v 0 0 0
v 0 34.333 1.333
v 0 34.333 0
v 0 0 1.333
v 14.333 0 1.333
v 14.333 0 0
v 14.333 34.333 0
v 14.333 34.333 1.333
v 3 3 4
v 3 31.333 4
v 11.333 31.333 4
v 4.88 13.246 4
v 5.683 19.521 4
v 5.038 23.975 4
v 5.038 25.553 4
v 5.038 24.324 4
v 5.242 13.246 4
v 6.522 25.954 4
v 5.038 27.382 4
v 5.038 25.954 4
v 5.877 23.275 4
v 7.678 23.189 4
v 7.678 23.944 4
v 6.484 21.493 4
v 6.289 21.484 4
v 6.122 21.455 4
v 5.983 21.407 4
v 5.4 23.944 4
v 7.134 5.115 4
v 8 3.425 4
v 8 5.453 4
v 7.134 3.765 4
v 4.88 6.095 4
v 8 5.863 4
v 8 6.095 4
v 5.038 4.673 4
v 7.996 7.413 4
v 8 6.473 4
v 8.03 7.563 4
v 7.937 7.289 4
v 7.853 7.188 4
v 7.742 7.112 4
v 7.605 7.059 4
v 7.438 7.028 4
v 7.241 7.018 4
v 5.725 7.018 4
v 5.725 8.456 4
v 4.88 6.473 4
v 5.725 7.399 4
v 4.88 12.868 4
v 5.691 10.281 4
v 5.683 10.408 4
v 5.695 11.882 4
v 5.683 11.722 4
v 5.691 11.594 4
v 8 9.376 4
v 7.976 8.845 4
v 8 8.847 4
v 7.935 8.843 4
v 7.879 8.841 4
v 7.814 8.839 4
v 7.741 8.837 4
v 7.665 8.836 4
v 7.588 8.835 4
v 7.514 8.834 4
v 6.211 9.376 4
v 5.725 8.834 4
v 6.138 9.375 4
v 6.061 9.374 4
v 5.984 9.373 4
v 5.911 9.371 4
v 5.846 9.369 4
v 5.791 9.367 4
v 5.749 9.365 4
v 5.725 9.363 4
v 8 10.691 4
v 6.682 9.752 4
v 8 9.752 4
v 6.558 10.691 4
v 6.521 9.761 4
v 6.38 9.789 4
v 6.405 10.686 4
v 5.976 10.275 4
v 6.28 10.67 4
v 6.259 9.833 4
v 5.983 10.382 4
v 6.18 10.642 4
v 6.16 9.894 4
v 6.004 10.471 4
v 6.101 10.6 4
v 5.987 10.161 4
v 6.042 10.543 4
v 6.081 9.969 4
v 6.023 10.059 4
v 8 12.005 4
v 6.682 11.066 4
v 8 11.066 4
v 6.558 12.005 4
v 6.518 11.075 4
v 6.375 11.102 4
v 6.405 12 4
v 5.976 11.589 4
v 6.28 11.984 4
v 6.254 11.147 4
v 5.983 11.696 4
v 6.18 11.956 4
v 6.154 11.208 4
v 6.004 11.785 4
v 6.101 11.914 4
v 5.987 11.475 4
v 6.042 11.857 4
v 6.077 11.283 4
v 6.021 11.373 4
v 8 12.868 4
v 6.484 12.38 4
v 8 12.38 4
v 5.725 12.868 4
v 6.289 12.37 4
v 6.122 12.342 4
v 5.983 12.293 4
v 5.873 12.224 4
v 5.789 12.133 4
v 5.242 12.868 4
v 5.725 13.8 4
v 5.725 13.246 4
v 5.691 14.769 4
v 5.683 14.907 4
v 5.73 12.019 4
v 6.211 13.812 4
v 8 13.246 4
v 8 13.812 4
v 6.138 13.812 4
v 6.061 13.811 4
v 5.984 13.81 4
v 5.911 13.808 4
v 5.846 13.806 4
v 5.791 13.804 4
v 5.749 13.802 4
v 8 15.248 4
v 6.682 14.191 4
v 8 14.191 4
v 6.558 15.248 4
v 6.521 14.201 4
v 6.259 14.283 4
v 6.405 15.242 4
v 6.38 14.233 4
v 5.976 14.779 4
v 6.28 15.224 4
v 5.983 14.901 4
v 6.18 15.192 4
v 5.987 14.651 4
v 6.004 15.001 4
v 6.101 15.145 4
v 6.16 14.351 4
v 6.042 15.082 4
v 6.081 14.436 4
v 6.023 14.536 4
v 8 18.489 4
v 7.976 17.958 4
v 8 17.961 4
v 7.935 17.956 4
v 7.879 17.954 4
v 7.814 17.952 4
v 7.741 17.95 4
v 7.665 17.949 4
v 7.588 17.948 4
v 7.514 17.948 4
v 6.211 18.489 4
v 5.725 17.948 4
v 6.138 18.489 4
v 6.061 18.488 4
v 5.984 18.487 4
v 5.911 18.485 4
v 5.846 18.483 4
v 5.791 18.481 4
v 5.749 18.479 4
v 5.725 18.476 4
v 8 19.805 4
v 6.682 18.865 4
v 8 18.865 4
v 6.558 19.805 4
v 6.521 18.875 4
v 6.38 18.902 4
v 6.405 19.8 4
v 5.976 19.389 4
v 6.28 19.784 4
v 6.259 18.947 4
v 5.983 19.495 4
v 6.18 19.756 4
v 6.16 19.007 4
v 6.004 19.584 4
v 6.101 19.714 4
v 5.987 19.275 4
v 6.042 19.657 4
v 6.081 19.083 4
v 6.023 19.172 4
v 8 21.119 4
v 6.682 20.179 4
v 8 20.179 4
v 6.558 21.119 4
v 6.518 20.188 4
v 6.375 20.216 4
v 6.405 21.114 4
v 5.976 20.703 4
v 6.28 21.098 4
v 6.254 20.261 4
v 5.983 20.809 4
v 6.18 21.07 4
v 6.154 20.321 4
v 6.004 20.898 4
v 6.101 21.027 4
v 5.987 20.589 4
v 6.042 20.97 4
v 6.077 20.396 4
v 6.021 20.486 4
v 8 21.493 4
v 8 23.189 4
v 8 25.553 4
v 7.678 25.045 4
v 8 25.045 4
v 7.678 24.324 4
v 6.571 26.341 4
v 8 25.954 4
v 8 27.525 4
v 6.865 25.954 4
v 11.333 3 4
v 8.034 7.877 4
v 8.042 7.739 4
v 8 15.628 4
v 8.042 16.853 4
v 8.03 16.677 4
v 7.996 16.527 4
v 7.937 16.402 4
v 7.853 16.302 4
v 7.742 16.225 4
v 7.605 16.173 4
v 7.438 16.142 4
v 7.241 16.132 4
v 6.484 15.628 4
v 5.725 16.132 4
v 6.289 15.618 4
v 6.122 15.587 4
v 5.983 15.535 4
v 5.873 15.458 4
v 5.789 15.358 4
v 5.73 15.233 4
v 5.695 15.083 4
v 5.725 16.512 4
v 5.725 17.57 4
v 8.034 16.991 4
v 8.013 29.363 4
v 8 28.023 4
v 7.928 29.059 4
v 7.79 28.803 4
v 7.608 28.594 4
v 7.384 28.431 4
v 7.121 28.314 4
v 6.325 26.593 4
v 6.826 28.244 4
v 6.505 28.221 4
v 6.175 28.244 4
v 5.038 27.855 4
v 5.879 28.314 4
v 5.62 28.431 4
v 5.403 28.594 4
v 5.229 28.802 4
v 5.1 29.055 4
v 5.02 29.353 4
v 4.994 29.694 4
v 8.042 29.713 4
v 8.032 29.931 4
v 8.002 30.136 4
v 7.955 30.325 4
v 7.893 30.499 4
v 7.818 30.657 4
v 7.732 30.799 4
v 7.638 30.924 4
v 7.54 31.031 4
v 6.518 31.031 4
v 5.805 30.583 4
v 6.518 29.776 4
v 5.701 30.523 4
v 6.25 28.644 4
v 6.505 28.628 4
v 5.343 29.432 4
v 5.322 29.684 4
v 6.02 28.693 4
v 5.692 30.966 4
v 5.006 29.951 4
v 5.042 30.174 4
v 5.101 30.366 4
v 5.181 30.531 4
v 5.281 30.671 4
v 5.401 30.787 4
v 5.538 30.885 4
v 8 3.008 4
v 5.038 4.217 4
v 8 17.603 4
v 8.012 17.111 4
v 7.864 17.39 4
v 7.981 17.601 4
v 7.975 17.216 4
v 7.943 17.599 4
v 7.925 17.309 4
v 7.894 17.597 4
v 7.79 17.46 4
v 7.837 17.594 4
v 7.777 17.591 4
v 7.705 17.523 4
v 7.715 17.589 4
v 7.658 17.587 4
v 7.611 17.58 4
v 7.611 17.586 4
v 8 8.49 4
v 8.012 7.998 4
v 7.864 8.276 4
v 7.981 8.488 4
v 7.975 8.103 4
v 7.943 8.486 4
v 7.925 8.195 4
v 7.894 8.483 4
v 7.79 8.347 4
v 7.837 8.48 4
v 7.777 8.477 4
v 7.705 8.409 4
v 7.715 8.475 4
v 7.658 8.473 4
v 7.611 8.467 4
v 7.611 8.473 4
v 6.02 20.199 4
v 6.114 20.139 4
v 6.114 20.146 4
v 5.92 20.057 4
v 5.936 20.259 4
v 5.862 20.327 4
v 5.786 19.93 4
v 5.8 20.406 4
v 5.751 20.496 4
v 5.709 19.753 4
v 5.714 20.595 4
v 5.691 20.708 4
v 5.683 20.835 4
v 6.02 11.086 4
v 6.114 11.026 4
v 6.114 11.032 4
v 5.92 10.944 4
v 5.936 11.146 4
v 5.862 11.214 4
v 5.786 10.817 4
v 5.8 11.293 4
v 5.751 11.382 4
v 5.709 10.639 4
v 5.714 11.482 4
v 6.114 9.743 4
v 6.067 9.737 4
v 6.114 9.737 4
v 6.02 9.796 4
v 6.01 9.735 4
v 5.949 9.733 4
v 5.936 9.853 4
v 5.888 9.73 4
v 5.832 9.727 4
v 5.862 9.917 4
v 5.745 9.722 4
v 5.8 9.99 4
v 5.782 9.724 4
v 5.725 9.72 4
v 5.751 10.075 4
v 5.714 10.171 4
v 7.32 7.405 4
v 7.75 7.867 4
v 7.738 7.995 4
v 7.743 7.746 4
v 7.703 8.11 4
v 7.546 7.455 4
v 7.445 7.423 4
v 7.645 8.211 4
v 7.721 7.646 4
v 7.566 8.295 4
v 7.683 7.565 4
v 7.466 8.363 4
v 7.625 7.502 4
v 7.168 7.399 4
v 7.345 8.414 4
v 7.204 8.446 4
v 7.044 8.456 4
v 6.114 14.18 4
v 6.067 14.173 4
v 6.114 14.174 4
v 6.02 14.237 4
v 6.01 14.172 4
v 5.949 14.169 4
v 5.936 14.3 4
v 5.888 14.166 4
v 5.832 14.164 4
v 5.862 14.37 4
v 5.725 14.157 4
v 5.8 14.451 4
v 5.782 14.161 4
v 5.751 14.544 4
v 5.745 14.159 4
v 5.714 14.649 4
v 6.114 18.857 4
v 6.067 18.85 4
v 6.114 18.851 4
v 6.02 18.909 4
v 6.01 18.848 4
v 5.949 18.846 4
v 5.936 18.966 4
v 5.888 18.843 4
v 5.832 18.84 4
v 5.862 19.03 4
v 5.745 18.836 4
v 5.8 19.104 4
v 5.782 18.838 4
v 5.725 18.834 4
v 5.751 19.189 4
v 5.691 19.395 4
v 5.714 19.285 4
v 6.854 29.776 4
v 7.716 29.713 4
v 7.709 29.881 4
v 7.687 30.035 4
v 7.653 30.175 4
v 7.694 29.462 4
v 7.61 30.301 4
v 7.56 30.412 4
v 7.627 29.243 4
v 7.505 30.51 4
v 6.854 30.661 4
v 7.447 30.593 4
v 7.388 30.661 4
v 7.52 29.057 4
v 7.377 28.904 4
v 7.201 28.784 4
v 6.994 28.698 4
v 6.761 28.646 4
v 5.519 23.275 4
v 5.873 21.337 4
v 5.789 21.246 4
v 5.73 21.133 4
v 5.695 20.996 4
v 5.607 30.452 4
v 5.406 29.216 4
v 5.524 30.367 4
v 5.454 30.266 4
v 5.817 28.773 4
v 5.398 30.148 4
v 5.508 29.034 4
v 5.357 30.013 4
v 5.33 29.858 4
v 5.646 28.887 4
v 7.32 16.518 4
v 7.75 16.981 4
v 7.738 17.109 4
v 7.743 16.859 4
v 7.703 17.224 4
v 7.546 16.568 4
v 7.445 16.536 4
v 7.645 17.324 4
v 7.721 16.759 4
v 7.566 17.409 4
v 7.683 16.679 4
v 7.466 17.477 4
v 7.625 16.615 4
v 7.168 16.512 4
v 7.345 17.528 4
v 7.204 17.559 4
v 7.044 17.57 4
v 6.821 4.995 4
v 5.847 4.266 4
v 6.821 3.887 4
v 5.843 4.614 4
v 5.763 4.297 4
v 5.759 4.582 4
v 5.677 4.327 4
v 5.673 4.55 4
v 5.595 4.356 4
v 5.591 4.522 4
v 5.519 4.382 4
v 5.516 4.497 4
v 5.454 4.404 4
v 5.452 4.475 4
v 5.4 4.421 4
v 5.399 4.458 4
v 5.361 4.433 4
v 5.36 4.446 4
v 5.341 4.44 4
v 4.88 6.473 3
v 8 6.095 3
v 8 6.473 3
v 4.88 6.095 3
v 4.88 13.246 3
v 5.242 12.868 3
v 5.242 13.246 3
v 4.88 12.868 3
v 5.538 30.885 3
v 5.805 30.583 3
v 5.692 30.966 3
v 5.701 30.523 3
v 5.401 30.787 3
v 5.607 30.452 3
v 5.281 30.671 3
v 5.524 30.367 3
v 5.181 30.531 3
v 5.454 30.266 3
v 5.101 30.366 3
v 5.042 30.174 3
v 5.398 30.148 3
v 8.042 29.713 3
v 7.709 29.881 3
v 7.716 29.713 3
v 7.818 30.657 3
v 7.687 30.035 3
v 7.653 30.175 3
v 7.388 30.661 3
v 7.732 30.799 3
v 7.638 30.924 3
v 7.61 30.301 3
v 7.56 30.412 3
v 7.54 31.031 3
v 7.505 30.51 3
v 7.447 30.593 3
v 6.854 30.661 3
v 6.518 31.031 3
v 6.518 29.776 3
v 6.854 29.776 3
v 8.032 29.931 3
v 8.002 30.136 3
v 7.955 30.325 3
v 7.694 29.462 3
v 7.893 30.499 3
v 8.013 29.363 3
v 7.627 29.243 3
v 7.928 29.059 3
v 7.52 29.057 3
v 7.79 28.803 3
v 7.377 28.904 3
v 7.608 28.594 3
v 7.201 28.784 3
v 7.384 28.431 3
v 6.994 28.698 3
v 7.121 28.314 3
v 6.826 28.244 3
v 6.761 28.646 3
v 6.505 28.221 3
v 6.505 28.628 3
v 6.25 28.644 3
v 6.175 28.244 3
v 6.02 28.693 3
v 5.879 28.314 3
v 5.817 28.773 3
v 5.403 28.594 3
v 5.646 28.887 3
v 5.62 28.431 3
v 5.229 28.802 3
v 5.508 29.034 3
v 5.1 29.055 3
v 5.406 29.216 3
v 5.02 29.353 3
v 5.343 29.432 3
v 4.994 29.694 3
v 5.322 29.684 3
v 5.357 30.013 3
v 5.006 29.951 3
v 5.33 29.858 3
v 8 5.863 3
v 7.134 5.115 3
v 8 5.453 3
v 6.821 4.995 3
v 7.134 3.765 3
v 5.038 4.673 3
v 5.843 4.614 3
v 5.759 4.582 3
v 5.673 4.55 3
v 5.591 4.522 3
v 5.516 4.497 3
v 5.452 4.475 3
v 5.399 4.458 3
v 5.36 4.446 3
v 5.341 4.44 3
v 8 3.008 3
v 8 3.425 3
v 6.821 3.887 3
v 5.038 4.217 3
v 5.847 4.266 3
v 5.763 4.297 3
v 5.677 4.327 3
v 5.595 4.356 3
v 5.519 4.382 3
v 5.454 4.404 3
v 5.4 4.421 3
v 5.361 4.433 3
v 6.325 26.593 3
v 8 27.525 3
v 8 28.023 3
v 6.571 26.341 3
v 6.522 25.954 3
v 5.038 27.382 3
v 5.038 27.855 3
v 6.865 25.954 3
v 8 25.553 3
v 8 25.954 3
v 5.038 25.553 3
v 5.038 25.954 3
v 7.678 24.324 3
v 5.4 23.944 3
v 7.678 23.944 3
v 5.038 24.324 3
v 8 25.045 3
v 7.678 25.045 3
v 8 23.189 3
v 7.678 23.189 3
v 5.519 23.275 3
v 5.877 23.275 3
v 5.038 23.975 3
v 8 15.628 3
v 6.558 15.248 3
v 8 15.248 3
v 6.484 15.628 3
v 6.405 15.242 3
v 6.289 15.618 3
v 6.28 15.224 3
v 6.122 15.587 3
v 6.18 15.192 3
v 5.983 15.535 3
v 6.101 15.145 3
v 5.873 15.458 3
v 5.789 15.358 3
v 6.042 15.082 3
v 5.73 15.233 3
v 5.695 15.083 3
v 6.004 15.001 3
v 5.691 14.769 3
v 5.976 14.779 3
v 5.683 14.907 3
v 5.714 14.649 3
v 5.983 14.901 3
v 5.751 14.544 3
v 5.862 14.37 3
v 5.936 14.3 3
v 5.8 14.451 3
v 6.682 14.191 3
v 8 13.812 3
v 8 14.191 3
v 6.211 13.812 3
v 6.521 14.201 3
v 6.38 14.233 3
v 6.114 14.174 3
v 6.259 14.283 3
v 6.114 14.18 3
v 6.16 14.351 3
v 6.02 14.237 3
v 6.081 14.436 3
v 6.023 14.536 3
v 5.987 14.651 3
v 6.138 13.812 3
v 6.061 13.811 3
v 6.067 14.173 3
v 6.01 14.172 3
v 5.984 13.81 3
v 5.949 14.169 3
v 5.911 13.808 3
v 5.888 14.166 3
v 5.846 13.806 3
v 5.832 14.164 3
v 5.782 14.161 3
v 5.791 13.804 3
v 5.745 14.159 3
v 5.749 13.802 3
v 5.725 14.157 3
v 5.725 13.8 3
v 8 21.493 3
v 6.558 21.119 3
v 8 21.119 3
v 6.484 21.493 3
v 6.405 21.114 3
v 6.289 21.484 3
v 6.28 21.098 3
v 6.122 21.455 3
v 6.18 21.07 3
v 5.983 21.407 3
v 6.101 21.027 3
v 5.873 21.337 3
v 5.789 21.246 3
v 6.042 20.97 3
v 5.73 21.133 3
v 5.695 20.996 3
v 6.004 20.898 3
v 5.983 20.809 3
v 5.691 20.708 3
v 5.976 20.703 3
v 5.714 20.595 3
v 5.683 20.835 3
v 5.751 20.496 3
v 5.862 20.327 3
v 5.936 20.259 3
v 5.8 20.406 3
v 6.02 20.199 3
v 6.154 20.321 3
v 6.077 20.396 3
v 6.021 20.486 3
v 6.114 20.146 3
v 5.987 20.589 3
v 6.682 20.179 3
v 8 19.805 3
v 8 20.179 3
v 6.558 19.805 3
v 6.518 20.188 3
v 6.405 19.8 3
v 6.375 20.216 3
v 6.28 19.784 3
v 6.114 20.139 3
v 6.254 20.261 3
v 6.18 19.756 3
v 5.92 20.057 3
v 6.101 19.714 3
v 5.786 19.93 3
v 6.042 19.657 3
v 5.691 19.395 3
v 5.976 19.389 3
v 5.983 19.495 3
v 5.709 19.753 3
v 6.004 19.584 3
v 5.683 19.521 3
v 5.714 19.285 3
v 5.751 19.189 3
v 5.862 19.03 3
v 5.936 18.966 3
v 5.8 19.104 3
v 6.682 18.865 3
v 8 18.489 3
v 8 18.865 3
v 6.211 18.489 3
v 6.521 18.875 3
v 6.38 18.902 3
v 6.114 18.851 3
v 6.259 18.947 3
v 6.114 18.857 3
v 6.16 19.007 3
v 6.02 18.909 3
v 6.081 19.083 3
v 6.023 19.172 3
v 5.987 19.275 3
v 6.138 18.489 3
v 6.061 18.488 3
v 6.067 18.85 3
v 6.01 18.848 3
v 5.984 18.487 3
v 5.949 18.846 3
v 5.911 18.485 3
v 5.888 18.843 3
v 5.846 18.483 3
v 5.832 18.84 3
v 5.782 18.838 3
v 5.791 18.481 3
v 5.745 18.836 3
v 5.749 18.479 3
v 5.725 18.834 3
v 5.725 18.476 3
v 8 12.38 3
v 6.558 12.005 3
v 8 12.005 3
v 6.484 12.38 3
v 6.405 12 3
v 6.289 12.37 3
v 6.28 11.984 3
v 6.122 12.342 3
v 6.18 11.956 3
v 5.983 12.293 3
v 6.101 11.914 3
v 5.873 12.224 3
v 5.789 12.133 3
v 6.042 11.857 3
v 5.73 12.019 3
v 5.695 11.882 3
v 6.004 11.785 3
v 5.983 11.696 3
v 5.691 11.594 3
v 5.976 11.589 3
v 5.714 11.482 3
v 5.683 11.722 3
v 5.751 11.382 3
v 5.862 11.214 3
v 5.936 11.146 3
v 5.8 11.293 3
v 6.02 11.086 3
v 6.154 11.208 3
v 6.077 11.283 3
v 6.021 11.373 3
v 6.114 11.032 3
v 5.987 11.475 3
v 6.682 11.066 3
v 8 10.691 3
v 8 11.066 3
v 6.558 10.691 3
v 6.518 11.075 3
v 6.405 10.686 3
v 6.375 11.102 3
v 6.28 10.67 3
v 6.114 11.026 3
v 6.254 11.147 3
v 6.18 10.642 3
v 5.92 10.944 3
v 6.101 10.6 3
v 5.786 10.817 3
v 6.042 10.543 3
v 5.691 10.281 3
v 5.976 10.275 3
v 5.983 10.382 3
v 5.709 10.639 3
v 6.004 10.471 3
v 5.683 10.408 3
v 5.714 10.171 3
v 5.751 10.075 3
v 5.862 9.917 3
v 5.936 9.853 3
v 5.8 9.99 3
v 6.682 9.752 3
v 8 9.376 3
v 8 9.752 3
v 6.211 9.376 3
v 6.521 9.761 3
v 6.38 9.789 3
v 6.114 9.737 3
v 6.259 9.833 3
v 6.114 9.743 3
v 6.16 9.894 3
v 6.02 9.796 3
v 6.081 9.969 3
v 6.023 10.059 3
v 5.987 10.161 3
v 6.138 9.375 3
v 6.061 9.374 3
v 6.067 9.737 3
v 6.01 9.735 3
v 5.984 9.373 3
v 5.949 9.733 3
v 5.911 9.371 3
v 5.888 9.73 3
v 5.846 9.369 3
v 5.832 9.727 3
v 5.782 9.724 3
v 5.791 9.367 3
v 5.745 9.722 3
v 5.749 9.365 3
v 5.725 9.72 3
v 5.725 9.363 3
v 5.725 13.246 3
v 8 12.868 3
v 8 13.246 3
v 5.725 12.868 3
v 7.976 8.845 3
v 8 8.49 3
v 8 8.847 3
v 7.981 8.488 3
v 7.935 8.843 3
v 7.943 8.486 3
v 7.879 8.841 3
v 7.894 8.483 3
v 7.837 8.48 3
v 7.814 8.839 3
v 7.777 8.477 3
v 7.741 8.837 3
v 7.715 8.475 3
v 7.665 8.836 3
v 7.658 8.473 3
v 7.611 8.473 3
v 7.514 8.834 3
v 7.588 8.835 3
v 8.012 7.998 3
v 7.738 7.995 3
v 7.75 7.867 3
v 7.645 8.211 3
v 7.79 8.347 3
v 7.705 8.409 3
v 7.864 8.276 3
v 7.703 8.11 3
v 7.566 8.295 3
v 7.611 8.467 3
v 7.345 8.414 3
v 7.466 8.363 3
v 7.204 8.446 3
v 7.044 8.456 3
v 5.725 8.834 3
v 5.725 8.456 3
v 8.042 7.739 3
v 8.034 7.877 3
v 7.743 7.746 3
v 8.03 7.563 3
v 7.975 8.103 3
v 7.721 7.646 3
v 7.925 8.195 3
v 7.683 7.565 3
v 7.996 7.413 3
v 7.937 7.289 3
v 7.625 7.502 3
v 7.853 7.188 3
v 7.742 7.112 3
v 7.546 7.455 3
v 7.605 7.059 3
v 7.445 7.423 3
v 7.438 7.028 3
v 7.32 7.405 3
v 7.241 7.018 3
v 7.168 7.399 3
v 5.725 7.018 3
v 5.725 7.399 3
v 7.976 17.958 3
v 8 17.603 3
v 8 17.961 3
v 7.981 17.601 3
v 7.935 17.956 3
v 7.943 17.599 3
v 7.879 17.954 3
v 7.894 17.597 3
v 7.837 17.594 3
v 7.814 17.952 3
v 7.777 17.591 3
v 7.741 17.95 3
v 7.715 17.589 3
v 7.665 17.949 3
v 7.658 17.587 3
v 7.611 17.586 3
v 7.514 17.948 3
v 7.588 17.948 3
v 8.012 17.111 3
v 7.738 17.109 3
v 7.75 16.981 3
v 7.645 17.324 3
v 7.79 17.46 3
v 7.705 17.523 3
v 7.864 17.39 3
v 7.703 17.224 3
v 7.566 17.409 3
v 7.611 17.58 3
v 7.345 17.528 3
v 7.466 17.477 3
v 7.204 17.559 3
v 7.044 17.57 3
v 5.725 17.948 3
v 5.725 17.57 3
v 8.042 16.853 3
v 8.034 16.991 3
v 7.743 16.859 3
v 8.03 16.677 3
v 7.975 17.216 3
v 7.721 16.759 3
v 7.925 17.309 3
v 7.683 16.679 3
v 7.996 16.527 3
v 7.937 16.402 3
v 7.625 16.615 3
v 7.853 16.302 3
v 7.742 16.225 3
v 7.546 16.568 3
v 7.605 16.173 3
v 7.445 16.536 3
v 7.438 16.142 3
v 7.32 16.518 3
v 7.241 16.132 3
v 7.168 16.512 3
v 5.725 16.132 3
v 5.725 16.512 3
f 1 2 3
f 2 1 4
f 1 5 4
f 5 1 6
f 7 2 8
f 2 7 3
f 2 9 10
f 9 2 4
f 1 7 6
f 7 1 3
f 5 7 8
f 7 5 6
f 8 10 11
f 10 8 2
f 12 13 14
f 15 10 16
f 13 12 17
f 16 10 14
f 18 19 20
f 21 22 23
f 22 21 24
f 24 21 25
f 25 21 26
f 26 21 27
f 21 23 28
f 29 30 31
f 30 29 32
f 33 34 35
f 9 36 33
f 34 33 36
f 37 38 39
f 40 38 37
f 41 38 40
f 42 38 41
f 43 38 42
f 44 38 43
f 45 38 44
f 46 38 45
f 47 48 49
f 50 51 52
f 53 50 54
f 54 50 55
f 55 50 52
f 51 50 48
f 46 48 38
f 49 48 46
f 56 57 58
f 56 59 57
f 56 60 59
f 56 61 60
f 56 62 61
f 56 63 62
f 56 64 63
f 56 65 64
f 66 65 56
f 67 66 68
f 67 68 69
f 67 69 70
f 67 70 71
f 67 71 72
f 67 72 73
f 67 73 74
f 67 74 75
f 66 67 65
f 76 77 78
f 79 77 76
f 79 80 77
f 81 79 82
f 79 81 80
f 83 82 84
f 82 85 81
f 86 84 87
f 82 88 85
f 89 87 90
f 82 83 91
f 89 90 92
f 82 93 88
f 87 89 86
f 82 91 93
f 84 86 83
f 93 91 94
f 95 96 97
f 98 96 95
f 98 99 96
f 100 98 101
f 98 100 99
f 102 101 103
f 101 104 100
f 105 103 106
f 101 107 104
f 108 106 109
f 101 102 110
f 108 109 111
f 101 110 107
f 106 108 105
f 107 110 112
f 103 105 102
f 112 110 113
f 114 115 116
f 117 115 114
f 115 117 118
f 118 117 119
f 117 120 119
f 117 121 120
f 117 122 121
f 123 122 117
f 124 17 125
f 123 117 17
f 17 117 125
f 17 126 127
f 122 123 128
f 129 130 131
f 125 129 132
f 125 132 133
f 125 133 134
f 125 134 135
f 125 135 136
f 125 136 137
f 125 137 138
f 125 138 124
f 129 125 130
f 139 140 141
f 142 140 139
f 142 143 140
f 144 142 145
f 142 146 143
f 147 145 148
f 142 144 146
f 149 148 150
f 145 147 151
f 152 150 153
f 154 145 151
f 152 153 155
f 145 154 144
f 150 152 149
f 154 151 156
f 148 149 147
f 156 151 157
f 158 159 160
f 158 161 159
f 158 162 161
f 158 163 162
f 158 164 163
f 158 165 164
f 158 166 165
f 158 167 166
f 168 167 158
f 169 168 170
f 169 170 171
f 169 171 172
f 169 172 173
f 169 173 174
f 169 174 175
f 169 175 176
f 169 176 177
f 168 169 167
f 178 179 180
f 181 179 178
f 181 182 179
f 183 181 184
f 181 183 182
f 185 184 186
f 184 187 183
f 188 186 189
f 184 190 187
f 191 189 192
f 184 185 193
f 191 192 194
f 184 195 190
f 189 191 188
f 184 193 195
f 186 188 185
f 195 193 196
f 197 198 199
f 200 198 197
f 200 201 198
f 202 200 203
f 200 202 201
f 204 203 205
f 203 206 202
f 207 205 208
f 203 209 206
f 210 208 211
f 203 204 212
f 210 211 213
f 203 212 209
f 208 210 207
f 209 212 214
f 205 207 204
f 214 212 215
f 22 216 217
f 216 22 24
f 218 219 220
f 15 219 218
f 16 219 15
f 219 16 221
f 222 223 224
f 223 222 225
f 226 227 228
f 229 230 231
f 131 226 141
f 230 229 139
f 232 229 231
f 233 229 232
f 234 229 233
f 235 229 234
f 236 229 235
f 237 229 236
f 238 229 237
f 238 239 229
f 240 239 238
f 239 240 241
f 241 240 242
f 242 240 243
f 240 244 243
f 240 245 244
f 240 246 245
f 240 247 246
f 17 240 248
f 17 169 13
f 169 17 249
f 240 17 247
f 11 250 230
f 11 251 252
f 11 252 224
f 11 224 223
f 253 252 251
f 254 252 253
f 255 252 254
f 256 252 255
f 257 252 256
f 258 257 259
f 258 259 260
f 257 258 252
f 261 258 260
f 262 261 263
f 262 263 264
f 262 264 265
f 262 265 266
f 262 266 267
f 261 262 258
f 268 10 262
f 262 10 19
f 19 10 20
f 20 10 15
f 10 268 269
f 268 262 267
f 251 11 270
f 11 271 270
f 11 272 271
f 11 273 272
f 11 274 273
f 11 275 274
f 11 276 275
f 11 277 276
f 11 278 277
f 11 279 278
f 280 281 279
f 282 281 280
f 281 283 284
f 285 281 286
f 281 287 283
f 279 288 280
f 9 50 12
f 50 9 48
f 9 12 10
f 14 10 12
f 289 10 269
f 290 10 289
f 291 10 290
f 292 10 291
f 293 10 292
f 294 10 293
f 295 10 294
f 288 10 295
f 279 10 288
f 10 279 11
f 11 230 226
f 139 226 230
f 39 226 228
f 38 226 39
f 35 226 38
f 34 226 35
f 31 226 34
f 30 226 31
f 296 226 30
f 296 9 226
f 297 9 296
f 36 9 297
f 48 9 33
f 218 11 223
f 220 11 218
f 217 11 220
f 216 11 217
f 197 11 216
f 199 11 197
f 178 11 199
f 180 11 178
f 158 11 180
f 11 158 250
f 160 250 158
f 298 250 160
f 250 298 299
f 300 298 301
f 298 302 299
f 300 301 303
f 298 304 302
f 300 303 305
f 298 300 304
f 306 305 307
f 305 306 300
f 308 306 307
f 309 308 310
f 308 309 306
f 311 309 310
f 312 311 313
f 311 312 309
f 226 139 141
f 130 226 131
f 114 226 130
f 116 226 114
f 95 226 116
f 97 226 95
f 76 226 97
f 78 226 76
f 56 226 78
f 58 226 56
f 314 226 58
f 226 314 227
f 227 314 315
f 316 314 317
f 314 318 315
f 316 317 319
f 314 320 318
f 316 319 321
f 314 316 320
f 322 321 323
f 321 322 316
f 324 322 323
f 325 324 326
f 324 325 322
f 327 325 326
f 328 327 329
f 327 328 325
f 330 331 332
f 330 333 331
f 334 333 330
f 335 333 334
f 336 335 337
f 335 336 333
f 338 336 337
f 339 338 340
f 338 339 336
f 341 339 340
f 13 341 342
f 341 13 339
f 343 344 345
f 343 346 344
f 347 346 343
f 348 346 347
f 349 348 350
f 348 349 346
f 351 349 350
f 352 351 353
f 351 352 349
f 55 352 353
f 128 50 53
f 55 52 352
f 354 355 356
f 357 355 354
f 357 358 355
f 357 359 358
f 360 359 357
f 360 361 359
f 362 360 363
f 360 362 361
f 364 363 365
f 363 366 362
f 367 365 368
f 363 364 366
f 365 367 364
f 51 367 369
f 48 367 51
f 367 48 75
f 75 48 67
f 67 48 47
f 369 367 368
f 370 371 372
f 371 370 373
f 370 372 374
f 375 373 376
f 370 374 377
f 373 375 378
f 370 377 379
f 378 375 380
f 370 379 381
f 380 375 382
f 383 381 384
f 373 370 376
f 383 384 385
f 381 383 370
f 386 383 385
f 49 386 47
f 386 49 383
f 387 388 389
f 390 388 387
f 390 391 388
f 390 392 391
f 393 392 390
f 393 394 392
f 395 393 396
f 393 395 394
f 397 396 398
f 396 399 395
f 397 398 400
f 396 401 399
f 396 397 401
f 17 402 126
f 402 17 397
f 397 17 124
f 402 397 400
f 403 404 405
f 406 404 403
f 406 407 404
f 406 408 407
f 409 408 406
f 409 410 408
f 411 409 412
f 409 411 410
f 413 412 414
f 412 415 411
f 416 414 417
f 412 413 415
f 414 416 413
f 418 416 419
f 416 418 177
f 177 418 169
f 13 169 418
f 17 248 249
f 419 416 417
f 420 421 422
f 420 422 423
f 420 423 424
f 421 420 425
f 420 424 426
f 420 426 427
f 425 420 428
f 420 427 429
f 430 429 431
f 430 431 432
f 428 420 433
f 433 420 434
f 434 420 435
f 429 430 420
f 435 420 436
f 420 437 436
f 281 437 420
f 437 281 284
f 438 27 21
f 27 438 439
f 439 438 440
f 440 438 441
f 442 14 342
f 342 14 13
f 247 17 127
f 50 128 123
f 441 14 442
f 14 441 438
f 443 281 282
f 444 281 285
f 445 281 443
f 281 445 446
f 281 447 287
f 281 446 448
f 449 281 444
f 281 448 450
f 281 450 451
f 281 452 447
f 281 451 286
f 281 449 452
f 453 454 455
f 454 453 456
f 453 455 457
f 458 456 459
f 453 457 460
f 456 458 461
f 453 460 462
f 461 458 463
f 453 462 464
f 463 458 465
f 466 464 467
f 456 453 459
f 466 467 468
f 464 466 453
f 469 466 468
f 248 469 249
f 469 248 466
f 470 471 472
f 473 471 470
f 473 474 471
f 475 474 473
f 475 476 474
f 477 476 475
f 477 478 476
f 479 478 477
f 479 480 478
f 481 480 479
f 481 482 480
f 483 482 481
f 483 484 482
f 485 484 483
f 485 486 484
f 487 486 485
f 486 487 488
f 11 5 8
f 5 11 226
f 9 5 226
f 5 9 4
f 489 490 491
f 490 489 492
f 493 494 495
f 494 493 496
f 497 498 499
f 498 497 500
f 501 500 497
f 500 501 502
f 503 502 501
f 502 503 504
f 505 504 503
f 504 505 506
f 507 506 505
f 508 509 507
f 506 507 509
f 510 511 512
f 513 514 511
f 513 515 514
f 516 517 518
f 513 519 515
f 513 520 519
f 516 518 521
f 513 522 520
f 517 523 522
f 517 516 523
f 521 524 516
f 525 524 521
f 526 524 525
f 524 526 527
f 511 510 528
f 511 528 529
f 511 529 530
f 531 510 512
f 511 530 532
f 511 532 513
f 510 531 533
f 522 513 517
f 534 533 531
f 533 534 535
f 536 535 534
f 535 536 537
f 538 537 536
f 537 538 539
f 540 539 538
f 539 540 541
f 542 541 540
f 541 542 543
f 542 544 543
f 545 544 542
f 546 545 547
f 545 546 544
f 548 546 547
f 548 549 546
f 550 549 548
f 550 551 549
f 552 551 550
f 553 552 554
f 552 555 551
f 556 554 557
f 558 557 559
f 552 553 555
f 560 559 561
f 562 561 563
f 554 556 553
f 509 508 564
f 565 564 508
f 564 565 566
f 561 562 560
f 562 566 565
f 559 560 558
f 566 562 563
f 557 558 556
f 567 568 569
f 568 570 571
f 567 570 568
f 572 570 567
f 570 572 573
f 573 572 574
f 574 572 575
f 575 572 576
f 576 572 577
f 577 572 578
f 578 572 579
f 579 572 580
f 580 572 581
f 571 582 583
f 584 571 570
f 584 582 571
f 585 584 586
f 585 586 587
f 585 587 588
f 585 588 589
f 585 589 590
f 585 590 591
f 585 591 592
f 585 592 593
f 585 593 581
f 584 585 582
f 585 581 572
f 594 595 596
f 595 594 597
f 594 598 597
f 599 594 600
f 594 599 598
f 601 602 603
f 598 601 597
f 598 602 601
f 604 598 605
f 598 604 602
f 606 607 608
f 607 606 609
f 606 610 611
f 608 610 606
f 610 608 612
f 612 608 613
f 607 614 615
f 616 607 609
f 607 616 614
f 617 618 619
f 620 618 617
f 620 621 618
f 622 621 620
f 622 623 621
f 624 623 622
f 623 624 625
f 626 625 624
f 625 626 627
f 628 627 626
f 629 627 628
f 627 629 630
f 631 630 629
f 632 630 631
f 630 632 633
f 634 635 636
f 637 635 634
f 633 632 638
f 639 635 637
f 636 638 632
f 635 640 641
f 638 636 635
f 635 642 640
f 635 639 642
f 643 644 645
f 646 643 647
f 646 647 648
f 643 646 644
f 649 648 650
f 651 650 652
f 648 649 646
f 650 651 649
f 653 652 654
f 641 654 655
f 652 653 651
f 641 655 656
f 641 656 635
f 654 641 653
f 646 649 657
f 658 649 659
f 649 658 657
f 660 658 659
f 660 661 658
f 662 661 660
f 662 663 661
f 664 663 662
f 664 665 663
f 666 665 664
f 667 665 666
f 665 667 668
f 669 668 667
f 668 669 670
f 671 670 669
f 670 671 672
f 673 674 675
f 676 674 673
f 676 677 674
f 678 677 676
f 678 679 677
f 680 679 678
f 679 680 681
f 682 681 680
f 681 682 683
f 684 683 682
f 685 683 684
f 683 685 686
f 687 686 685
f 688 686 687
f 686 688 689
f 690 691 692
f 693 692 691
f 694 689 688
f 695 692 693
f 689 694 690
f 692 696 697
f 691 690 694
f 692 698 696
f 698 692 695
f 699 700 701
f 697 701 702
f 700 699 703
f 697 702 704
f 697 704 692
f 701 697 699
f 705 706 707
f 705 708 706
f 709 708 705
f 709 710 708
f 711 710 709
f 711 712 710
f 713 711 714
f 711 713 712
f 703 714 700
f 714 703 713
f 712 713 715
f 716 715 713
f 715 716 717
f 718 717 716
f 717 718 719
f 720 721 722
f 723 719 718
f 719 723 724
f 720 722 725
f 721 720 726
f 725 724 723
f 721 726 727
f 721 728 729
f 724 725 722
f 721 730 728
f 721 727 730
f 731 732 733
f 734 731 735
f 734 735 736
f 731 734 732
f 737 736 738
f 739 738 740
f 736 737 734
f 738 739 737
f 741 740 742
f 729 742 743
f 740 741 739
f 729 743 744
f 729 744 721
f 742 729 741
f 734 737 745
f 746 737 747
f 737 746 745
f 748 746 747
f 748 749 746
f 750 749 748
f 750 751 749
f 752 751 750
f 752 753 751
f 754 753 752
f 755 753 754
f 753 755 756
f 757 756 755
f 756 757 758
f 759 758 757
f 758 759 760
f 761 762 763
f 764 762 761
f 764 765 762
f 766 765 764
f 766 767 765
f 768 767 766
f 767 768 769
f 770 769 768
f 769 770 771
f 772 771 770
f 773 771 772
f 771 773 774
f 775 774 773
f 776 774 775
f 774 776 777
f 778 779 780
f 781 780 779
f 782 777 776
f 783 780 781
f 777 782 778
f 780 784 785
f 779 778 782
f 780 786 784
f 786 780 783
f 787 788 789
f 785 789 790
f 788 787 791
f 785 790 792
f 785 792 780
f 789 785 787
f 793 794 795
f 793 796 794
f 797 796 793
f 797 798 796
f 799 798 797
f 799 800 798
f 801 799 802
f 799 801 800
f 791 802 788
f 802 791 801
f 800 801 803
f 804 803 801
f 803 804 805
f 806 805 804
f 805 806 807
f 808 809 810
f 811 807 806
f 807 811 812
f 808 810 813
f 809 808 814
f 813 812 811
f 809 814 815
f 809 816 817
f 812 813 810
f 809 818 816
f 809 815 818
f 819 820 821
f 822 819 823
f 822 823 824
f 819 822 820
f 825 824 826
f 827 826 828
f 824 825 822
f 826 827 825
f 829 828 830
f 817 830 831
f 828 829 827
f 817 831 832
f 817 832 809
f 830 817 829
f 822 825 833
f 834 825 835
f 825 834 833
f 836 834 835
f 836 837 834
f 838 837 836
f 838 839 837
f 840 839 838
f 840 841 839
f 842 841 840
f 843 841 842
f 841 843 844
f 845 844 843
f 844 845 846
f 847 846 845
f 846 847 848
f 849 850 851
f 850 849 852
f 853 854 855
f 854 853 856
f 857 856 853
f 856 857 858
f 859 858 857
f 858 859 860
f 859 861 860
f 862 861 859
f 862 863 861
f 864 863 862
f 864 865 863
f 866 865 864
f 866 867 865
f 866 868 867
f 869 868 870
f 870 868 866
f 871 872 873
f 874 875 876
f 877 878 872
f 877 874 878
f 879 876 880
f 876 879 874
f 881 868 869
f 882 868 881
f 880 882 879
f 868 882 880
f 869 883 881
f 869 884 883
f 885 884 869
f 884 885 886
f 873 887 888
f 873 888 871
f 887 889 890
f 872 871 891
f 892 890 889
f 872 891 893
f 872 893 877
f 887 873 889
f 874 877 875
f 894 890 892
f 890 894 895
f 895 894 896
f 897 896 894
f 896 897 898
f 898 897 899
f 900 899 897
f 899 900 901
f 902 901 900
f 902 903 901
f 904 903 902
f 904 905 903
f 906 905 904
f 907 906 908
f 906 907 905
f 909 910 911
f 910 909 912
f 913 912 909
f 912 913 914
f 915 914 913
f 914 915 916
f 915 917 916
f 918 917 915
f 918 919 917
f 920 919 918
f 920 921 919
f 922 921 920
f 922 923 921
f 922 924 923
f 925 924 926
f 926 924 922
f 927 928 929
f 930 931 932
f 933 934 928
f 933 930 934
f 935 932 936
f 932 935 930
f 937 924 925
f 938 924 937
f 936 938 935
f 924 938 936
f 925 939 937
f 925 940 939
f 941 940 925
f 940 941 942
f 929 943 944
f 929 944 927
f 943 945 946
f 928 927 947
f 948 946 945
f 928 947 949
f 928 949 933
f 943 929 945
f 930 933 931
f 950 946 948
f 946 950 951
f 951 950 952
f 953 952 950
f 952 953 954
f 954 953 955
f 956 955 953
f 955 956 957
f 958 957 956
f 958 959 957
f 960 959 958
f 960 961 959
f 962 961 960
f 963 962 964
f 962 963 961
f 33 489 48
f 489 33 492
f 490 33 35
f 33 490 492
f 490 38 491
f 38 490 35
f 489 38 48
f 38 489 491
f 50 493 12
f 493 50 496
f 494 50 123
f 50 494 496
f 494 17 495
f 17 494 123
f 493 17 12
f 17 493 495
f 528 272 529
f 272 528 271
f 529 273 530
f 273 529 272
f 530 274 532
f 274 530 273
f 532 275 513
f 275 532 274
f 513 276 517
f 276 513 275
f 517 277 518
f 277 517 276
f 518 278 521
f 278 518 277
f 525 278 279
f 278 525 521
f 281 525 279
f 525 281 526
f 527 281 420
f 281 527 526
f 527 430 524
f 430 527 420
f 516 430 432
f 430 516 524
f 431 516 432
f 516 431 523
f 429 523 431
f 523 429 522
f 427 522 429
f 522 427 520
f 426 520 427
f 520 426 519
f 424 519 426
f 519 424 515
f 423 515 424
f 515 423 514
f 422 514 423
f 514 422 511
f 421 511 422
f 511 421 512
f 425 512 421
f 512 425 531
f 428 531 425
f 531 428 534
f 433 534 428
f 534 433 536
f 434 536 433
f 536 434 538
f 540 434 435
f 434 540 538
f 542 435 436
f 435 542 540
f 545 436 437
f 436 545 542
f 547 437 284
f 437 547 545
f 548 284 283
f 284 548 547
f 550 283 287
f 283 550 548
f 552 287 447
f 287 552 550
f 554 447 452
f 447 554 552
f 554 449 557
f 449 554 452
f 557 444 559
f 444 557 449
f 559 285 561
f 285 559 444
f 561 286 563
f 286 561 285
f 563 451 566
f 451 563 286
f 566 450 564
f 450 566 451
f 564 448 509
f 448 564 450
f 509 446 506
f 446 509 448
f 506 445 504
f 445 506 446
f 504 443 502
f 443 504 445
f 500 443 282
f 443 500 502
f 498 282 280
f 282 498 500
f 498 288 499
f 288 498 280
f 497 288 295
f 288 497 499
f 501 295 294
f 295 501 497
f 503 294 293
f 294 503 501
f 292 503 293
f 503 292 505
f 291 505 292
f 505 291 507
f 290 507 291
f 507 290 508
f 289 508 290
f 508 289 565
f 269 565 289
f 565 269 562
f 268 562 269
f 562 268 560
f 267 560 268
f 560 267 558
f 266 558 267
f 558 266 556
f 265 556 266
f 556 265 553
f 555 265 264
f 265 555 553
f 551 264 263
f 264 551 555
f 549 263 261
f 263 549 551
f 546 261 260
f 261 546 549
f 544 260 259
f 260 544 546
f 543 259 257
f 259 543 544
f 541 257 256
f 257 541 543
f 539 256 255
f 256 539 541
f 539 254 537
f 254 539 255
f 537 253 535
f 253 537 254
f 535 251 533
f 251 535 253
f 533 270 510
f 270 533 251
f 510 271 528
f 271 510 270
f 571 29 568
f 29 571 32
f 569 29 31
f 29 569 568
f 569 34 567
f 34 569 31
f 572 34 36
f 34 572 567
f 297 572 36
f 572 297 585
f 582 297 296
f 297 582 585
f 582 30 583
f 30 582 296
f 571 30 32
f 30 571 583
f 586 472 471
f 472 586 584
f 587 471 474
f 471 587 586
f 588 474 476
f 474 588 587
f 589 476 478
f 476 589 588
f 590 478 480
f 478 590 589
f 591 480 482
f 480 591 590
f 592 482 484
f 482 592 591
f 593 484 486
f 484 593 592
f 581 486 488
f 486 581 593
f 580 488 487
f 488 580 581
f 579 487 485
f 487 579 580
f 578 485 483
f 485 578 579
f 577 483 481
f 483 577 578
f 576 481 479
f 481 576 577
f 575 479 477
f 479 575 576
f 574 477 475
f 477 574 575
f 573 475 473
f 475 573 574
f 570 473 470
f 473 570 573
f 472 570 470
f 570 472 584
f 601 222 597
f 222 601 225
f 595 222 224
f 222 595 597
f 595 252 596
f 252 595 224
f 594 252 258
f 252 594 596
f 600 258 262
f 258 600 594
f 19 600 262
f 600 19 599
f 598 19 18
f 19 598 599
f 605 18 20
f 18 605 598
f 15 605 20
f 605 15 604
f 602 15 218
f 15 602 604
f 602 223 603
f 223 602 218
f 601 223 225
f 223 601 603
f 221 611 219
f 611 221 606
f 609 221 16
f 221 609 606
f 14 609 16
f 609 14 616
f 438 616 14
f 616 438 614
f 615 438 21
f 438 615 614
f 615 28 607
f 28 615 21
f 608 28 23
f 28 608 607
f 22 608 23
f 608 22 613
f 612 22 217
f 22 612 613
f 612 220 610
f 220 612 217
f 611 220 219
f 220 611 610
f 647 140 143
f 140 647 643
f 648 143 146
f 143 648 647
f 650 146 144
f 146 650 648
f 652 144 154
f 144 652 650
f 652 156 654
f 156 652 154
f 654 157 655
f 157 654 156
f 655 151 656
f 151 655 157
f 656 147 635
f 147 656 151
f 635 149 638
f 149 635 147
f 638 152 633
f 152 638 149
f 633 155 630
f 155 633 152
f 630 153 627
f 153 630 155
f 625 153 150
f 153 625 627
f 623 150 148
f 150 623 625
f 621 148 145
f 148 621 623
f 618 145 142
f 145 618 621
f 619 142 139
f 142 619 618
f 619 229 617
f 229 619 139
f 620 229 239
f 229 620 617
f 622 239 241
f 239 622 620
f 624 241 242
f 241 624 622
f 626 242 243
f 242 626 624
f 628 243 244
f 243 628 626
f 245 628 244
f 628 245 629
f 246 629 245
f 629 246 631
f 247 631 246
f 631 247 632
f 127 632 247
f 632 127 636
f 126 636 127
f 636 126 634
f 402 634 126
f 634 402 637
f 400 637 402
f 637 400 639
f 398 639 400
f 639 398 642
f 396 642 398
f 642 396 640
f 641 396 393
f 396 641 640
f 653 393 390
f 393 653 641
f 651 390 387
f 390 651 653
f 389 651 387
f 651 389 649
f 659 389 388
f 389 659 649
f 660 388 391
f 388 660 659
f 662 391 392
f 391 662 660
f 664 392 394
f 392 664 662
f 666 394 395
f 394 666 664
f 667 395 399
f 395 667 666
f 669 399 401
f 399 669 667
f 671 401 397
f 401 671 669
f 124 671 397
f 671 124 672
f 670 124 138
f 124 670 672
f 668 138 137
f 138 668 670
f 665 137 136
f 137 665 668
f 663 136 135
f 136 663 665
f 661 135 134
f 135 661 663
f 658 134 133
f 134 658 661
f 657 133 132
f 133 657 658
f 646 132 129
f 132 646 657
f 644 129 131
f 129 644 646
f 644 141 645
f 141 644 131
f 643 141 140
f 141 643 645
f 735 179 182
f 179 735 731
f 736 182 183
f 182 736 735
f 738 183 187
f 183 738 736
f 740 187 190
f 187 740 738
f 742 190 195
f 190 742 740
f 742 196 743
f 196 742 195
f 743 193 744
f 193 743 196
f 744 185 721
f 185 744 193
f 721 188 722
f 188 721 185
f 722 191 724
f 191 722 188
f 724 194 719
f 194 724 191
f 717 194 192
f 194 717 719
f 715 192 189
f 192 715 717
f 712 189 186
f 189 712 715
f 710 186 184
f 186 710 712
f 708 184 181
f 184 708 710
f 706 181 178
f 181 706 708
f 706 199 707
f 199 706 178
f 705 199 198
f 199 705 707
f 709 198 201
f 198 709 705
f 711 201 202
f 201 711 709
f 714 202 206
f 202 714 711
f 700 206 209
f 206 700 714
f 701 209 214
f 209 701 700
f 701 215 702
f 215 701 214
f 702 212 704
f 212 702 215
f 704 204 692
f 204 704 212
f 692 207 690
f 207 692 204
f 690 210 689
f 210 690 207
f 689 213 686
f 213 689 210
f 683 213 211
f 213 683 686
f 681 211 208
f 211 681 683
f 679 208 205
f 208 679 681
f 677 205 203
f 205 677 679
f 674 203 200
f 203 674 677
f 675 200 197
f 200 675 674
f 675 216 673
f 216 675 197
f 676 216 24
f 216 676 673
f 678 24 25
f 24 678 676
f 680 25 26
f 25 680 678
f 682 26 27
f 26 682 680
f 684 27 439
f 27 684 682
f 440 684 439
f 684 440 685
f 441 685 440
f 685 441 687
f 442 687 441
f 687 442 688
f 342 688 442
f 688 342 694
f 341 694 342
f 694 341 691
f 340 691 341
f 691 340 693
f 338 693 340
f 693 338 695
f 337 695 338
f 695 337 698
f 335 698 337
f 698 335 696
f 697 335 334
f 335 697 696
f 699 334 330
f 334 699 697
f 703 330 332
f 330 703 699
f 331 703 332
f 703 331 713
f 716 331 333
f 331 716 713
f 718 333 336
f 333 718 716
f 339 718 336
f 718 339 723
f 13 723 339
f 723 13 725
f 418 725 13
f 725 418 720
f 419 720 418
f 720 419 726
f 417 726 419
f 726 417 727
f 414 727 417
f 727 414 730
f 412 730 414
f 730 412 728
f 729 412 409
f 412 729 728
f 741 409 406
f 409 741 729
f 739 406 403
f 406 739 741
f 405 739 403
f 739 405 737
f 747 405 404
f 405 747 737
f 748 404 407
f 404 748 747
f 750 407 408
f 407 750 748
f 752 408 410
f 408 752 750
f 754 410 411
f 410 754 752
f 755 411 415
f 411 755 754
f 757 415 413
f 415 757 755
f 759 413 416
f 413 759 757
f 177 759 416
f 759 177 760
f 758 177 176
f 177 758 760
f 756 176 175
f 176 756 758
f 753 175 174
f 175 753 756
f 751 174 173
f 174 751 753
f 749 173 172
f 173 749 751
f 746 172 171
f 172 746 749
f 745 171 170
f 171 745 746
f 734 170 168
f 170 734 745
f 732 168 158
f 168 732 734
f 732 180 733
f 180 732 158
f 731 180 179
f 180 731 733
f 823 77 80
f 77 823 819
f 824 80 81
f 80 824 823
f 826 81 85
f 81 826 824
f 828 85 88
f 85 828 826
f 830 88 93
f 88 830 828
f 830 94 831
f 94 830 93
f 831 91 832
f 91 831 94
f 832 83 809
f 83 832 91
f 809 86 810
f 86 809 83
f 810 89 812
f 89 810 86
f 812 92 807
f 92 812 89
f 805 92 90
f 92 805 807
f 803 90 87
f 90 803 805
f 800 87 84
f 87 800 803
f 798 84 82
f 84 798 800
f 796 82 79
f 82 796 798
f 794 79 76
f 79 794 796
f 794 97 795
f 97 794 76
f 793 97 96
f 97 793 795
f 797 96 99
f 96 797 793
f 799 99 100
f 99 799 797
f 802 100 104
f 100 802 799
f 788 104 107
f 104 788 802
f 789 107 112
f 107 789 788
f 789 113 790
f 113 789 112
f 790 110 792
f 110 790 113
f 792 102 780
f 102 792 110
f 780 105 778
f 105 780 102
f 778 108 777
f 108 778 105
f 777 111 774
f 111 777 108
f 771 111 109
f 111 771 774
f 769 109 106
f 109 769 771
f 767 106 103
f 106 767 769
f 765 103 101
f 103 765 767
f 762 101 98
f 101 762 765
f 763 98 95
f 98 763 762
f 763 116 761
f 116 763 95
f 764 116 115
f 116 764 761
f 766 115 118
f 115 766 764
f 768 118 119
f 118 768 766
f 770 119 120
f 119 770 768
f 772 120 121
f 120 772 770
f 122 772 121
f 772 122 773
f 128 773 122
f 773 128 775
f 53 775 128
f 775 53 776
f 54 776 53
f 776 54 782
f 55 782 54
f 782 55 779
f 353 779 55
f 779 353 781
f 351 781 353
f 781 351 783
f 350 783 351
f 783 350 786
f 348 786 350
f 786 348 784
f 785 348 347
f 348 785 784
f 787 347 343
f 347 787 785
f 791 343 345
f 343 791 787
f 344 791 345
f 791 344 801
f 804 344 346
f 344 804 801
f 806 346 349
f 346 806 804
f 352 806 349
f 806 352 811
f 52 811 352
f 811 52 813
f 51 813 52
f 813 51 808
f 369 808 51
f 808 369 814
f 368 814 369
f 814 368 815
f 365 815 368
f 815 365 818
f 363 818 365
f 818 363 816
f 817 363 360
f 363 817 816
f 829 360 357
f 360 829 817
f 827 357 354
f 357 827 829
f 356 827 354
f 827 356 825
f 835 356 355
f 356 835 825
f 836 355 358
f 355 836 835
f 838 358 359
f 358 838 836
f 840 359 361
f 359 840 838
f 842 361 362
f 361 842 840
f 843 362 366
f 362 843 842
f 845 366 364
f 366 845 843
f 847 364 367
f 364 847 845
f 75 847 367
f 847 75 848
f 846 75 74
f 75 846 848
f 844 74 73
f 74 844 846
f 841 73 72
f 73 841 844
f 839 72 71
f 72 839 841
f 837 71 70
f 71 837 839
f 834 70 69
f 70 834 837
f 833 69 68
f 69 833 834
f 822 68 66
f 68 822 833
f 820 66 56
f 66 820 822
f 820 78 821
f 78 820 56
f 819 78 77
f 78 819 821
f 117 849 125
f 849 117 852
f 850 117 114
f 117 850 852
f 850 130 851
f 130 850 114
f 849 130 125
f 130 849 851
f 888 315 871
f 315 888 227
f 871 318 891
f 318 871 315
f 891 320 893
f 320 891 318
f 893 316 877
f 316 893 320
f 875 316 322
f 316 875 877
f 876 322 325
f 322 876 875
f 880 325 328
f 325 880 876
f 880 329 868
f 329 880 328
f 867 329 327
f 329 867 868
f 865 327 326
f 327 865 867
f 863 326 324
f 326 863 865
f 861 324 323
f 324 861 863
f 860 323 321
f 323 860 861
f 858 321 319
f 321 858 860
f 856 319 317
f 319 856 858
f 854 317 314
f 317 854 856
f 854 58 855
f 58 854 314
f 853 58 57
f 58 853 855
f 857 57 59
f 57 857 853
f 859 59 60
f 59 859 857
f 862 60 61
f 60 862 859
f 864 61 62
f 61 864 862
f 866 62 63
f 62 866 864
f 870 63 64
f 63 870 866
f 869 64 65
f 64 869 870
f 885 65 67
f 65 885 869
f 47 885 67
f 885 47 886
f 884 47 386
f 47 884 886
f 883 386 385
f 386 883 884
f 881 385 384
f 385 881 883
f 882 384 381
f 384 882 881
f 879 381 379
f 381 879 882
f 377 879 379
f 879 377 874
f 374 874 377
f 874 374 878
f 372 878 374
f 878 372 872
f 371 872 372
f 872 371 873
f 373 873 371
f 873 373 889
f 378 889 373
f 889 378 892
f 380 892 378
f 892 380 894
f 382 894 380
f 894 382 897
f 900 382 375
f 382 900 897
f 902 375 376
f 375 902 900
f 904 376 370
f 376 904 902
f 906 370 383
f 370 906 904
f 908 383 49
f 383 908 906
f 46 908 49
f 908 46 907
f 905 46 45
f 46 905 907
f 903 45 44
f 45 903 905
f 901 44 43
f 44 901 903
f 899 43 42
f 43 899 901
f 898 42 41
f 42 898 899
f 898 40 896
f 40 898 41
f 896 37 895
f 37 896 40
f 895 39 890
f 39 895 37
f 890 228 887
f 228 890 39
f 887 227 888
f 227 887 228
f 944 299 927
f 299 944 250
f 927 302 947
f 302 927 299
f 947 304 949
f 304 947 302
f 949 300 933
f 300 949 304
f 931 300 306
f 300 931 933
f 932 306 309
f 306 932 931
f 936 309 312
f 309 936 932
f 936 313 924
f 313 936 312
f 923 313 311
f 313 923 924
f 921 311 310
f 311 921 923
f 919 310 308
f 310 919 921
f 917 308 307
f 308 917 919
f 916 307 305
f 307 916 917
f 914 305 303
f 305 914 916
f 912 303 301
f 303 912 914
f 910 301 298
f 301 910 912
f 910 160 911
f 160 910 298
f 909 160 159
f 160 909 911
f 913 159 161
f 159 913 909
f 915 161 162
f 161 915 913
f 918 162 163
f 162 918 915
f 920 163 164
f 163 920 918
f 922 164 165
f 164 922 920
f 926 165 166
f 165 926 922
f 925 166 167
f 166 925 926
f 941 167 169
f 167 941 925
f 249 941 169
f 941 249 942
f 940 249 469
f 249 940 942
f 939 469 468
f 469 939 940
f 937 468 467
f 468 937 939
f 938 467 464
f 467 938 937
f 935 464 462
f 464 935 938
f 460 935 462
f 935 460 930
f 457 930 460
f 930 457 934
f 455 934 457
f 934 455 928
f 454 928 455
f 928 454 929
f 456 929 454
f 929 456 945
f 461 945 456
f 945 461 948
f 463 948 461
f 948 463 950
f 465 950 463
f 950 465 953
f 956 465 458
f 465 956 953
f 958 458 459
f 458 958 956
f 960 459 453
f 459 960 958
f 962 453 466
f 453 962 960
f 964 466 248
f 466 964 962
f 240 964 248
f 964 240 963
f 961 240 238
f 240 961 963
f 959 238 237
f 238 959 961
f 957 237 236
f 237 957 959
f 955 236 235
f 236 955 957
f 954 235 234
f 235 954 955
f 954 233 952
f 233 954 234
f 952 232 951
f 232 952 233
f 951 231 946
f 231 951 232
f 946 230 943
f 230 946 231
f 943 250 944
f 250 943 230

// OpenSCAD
//Box
box_height = 4;
//Top box
top_box_origin_length = 3;
top_box_length = 30;
top_box_origin_width = 10;
top_box_width = 3;
top_box_height = box_height/3;
top_box_bottom_left =  [top_box_origin_width, top_box_origin_length, top_box_height + top_box_height];
top_box_bottom_right = [top_box_width, top_box_origin_length, top_box_height + top_box_height];
top_box_top_left =     [top_box_origin_width, top_box_length, top_box_height + top_box_height];
top_box_top_right =    [top_box_width, top_box_length, top_box_height + top_box_height];

top_box = [
top_box_bottom_left,
top_box_bottom_right,
top_box_top_left,
top_box_top_right
];

//Bottom box
bottom_box_length = 33;
bottom_box_width = 13;
bottom_box_bottom_left =  [0,                0, 0];
bottom_box_bottom_right = [bottom_box_width, 0, 0];
bottom_box_top_left =     [0,                bottom_box_length, 0];
bottom_box_top_right =    [bottom_box_width, bottom_box_length, 0];

bottom_box = [
bottom_box_bottom_left,
bottom_box_bottom_right,
bottom_box_top_left,
bottom_box_top_right
];

boxes = [bottom_box, top_box];

//Text
text = "Aluminum 1KG";
text_depth = 1;
text_size = 3.1;
text_translate = [8, 3, box_height-text_depth];
text_rotate = [0, 0, 90];

difference(){
	hull(){
		for(box=boxes){
			for(point=box){
				translate(point){
					cube(top_box_height);
				}
			}
		}
	}
	translate(text_translate){
		rotate(text_rotate){
			linear_extrude(text_depth){
				#text(text, size=text_size);
			}
		}
	}
}
